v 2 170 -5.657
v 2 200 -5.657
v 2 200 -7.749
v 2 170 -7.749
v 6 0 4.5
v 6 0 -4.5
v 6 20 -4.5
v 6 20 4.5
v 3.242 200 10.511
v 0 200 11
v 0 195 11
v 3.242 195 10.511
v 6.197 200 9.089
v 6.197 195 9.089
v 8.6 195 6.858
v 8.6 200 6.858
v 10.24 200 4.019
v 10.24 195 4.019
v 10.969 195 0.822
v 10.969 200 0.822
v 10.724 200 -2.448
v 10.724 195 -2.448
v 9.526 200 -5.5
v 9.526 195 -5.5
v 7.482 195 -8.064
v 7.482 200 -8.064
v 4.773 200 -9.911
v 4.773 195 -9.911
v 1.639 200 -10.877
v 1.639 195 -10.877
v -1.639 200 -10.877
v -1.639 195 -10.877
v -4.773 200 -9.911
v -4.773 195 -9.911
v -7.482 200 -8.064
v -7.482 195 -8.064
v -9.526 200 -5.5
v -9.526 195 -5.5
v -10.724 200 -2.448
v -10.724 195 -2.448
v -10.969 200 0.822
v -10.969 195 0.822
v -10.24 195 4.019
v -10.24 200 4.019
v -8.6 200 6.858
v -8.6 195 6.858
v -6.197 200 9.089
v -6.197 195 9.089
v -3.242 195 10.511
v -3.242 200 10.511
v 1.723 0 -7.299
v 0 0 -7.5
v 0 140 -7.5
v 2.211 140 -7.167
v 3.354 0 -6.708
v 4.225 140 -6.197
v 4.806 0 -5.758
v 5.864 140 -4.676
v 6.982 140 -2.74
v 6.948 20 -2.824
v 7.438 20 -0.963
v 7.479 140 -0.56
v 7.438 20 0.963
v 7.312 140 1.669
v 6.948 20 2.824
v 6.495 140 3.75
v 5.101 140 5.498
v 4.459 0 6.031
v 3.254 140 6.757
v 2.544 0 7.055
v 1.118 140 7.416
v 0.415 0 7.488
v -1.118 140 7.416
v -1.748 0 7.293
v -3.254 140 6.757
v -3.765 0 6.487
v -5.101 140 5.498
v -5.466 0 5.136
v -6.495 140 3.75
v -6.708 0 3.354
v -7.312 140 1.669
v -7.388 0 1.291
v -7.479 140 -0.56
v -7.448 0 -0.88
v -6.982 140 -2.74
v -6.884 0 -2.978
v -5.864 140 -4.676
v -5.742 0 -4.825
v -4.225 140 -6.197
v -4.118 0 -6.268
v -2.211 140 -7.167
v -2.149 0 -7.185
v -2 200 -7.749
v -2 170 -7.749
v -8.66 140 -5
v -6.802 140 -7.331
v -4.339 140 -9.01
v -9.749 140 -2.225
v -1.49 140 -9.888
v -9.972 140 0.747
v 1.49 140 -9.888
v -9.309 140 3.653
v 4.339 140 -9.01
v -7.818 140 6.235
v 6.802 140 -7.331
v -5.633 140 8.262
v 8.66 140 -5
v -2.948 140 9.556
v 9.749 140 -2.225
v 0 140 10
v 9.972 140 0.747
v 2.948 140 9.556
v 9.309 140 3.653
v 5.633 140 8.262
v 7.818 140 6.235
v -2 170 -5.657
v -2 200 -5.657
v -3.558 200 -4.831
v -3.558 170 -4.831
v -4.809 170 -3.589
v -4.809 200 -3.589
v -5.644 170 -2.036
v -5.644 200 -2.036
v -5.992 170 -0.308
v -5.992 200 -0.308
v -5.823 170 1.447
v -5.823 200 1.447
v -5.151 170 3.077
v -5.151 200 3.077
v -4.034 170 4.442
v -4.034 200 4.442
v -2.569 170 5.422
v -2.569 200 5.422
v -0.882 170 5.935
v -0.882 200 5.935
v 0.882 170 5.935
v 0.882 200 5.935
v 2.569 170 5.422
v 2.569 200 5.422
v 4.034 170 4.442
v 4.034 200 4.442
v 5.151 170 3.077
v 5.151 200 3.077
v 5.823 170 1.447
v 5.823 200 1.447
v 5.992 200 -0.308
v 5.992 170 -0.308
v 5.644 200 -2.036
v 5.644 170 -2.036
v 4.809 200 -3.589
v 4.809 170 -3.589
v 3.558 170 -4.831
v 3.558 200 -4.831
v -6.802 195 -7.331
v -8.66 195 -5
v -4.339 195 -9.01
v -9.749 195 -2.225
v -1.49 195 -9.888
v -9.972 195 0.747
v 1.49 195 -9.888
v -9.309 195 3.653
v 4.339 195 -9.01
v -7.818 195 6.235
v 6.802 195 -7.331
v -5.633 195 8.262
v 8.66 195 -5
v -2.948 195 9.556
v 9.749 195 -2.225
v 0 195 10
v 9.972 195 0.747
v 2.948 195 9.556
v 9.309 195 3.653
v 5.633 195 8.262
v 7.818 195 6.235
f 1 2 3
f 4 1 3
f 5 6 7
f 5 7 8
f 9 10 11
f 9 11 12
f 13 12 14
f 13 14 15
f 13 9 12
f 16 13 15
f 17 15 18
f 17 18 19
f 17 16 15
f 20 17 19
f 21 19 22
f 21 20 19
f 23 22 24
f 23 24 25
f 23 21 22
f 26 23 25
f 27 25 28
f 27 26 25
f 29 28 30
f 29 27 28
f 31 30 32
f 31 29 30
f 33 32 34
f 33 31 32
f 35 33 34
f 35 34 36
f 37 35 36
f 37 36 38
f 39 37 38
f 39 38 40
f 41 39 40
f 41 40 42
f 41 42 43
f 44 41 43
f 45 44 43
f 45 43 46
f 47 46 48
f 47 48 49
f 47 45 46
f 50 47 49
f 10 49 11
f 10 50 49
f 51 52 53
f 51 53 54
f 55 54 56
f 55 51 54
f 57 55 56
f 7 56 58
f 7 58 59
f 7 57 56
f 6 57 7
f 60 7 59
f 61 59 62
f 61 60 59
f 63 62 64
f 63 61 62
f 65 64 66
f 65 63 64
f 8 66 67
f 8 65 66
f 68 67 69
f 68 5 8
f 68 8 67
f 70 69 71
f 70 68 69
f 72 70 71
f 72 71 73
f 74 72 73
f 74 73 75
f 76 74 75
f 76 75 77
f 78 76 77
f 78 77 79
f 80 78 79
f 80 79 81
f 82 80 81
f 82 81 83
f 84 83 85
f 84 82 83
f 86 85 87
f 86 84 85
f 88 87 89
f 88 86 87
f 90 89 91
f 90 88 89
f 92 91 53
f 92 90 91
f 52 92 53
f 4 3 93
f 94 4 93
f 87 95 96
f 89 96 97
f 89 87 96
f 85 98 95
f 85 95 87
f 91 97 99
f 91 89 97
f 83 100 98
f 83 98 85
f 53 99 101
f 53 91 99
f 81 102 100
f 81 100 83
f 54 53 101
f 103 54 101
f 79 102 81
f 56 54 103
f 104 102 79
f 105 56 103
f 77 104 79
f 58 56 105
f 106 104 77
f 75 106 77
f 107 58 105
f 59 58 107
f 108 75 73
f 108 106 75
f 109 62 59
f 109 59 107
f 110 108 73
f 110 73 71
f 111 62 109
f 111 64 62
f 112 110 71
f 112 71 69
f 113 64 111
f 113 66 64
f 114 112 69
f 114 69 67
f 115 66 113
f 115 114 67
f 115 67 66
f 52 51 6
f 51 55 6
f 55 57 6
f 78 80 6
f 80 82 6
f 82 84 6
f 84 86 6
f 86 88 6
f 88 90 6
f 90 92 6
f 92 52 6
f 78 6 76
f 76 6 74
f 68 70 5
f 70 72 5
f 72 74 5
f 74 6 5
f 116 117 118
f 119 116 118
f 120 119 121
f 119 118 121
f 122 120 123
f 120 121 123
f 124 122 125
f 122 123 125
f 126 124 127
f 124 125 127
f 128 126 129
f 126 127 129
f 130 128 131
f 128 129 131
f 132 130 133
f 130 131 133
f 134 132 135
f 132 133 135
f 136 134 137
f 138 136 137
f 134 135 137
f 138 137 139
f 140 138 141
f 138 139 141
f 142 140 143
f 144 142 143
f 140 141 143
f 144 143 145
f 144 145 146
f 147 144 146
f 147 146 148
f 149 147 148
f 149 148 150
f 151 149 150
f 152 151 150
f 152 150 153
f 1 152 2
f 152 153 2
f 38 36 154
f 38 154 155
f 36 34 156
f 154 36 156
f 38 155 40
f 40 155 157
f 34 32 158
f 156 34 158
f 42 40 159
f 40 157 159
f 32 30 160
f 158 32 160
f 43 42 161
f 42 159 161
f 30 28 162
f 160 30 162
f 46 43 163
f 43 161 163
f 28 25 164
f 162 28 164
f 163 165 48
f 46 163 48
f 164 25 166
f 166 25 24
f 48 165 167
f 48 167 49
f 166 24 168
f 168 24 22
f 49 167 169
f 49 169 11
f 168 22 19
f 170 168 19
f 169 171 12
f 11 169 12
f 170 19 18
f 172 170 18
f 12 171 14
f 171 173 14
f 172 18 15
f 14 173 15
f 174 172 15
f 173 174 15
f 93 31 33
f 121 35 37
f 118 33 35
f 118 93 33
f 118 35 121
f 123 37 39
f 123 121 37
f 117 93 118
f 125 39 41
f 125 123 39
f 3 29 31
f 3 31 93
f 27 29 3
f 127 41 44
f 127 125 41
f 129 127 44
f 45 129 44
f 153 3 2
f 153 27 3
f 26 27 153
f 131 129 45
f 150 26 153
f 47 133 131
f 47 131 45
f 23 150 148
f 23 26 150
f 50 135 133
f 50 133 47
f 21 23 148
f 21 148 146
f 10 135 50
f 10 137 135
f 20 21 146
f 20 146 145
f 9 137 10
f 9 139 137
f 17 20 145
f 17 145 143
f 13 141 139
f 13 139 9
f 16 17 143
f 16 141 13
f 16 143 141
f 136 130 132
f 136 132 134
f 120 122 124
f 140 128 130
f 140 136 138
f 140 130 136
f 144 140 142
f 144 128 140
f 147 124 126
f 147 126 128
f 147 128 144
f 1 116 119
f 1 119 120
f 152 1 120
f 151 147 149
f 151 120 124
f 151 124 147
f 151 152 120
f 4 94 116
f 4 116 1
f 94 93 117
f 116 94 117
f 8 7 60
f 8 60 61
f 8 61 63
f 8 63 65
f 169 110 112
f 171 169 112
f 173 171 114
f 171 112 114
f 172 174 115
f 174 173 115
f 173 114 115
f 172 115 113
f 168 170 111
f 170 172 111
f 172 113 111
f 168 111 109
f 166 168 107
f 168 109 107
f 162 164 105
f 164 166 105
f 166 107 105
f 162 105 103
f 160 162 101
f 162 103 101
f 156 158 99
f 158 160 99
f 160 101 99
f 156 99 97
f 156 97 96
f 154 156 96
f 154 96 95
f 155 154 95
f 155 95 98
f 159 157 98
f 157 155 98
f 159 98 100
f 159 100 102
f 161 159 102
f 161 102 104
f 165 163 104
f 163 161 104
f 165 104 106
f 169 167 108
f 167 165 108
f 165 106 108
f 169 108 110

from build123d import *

# Parameters (mm, degrees)
SKETCH2_R         = 10
EXTRUDE1_DEPTH    = 200
EXTRUDE2_DEPTH    = 30
SKETCH5_OUTSIDE_W = 62.398
SKETCH5_OUTSIDE_H = 62.398
SKETCH5_OUTSIDE_R = 7.5
EXTRUDE4_DEPTH    = 140
SKETCH6_R         = 11
SKETCH6_R_2       = 8.630699516
EXTRUDE5_DEPTH    = 5
SKETCH7_W         = 11.867066039
SKETCH7_H         = 33.623353778
EXTRUDE6_DEPTH    = 20


with BuildPart() as part:
    # Sketch2 → Extrude1 (new body)
    with BuildSketch(Plane(origin=(0, 0, 0), x_dir=(1, 0, 0), z_dir=(0, 1, 0))):
        with Locations(Location((0, 0, 0), (0, 0, 270))):
            Circle(SKETCH2_R)
    extrude(amount=EXTRUDE1_DEPTH)

    # Sketch3 → Extrude2 (cut)
    with BuildSketch(Plane(origin=(0, 200, 0), x_dir=(1, 0, 0), z_dir=(0, 1, 0))):
        with BuildLine():
            Line((2, 5.656854249), (2, 7.749317393))
            Line((2, 7.749317393), (-2, 7.749317393))
            Line((-2, 7.749317393), (-2, 5.656854249))
            ThreePointArc((-2, 5.656854249), (0, -6), (2, 5.656854249))
        make_face()
    extrude(amount=-EXTRUDE2_DEPTH, mode=Mode.SUBTRACT)

    # Sketch5 outside → Extrude4 (cut)
    with BuildSketch(Plane.XZ):
        Rectangle(SKETCH5_OUTSIDE_W, SKETCH5_OUTSIDE_H)
        with Locations(Location((0, 0, 0), (0, 0, 270))):
            Circle(SKETCH5_OUTSIDE_R, mode=Mode.SUBTRACT)
    extrude(amount=-EXTRUDE4_DEPTH, mode=Mode.SUBTRACT)

    # Sketch6 → Extrude5 (add)
    with BuildSketch(Plane(origin=(0, 200, 0), x_dir=(1, 0, 0), z_dir=(0, 1, 0))):
        with Locations(Location((0, 0, 0), (0, 0, 270))):
            Circle(SKETCH6_R)
        Circle(SKETCH6_R_2, mode=Mode.SUBTRACT)
    extrude(amount=-EXTRUDE5_DEPTH)

    # Sketch7 → Extrude6 (cut)
    with BuildSketch(Plane.XZ):
        with Locations((11.93353302, 6.659772738)):
            Rectangle(SKETCH7_W, SKETCH7_H)
    extrude(amount=-EXTRUDE6_DEPTH, mode=Mode.SUBTRACT)


solid = part.part
